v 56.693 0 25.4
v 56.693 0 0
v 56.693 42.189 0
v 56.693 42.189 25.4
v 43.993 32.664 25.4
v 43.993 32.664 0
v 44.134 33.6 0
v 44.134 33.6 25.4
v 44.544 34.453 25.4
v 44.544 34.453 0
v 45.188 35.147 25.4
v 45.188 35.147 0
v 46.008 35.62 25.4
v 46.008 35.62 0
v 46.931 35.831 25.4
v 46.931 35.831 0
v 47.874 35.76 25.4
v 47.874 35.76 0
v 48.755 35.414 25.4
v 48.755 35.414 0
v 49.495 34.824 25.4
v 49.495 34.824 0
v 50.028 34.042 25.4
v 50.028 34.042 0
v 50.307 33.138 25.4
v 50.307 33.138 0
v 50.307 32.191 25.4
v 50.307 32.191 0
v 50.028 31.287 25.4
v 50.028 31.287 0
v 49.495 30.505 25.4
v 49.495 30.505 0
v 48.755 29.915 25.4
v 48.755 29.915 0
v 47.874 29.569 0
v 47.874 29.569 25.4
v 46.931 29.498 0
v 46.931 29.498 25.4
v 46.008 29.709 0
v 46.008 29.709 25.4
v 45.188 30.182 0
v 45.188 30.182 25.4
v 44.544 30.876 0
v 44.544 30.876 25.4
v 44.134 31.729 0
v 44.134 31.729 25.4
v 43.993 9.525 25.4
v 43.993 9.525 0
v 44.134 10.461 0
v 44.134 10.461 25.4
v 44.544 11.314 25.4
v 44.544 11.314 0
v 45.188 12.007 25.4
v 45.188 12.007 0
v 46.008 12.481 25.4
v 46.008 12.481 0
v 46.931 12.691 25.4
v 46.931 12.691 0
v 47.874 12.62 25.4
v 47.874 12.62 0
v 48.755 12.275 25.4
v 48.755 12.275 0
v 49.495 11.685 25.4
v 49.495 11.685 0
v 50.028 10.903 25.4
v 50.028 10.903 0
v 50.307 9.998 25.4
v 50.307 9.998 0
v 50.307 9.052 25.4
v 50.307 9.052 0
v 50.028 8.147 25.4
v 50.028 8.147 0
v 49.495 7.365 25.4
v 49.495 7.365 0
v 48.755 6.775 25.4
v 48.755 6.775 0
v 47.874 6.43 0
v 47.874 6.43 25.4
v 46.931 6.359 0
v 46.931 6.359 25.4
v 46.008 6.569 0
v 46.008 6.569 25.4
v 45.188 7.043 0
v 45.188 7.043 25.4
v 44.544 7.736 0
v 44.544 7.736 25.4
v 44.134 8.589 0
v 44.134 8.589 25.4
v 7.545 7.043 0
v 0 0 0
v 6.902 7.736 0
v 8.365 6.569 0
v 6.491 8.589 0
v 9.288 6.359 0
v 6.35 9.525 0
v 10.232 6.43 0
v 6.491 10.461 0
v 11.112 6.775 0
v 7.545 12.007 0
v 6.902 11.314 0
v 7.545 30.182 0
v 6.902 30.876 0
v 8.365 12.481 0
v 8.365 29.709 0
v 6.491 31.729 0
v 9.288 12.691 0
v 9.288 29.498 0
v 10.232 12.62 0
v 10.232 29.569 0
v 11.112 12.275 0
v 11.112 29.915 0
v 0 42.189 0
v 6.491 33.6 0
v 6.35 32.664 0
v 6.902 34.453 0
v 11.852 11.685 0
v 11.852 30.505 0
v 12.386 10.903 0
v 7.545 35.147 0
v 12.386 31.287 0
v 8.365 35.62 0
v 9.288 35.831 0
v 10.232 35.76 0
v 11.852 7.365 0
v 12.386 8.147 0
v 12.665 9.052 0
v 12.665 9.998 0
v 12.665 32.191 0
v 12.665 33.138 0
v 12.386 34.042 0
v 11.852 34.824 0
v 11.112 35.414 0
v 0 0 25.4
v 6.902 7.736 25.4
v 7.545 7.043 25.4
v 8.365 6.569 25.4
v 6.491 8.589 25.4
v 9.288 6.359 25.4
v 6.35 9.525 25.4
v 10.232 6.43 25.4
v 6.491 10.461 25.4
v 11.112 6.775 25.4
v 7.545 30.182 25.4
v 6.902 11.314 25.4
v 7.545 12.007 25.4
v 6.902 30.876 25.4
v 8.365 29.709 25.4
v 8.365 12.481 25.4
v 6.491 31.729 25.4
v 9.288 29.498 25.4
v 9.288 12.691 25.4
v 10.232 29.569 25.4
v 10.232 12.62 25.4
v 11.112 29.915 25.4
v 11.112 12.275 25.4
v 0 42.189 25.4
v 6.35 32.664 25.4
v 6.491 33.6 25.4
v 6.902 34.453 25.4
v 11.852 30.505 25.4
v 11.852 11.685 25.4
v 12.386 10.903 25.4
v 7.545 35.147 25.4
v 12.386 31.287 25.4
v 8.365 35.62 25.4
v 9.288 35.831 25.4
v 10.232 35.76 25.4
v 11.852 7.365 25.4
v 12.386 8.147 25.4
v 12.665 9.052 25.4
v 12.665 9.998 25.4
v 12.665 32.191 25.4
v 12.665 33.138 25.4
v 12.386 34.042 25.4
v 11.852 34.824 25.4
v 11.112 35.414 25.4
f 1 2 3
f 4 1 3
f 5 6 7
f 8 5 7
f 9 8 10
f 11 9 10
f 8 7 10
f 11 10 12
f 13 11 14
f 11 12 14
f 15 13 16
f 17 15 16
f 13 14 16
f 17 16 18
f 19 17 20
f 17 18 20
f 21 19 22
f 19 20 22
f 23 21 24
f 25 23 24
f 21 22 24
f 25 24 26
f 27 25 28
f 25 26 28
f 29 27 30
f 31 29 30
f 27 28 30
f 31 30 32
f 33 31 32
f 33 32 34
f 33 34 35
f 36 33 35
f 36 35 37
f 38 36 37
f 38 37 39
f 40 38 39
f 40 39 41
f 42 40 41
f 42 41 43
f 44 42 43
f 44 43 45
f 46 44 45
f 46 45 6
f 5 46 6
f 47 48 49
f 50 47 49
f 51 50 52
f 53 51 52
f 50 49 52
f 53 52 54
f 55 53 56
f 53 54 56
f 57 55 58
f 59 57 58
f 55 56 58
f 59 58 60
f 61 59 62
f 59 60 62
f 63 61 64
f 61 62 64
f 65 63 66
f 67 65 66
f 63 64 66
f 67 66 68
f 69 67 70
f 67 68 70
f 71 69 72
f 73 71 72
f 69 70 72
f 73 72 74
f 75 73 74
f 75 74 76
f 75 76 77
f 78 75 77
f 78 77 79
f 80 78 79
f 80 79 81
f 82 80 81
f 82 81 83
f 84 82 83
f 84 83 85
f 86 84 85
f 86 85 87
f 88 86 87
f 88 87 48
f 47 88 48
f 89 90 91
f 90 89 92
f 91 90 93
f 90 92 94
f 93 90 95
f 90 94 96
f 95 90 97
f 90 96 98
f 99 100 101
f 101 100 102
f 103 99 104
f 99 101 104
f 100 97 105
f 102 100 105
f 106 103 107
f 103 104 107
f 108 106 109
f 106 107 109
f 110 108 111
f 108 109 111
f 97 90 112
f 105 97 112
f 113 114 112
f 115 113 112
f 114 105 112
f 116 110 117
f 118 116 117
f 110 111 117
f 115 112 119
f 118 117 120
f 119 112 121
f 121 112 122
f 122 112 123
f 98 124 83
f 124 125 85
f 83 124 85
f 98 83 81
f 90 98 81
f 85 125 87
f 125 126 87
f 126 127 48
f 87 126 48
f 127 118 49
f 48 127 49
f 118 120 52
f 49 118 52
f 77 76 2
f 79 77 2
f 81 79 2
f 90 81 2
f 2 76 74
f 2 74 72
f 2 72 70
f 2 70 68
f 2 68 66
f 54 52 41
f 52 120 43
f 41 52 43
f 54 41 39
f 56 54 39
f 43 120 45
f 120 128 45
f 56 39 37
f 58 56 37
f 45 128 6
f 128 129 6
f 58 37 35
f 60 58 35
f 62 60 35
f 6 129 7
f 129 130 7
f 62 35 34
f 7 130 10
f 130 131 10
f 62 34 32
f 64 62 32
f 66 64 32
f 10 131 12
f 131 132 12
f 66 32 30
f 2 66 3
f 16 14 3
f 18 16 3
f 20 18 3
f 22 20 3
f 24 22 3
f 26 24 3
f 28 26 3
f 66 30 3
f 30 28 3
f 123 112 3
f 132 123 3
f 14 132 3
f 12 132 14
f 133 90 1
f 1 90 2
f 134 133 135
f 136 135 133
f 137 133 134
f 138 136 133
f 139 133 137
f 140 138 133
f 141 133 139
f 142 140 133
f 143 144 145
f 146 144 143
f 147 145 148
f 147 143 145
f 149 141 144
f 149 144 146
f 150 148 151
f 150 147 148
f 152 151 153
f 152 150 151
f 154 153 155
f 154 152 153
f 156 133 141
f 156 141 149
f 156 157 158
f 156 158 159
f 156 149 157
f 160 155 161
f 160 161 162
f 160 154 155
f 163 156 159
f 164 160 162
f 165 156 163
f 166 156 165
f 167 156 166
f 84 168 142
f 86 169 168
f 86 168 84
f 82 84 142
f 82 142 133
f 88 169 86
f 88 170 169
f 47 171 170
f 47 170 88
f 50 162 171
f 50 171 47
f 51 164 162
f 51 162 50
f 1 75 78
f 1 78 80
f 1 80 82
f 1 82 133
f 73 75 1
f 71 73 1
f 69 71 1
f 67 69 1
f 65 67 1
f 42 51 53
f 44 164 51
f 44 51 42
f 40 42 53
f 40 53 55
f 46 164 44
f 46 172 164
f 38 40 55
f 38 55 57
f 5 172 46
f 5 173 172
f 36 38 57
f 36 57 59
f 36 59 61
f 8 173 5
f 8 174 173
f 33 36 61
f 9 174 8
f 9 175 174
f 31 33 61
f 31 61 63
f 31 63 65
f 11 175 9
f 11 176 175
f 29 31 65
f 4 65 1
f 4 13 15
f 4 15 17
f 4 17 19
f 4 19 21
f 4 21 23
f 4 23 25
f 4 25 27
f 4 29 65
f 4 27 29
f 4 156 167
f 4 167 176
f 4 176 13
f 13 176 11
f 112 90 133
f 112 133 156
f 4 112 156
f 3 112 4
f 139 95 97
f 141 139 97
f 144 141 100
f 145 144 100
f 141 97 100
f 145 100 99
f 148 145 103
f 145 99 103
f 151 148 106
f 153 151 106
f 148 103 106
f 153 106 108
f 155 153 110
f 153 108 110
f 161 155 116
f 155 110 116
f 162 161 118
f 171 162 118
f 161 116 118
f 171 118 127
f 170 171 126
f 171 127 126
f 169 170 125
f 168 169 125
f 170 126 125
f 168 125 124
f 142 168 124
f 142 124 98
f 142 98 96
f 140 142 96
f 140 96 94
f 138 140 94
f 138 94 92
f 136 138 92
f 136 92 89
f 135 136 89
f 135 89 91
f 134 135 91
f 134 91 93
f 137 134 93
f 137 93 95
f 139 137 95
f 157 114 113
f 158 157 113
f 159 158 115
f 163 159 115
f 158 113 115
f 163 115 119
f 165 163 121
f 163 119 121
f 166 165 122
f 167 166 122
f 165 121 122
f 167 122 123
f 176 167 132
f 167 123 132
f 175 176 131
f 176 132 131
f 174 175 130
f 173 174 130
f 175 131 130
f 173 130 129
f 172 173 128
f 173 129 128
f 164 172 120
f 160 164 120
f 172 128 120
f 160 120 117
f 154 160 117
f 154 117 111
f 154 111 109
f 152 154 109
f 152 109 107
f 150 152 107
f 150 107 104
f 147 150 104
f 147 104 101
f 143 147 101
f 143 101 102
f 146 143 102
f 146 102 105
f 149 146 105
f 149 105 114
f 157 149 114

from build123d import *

# Parameters (mm, degrees)
F0_W     = 56.6928
F0_H     = 42.1894
F1_DEPTH = 25.4
F3_D     = 6.35


with BuildPart() as f1:
    # F0 (on Top) → F1 (new body)
    with BuildSketch(Plane.XY):
        with Locations((28.3464, 21.0947)):
            Rectangle(F0_W, F0_H)
    extrude(amount=F1_DEPTH)

    # F3 (through all)
    with Locations(Plane.XY.offset(25.4)):
        with Locations((9.525, 9.525), (9.525, 32.6644), (47.1678, 32.6644), (47.1678, 9.525)):
            Hole(F3_D / 2)


solid = f1.part
